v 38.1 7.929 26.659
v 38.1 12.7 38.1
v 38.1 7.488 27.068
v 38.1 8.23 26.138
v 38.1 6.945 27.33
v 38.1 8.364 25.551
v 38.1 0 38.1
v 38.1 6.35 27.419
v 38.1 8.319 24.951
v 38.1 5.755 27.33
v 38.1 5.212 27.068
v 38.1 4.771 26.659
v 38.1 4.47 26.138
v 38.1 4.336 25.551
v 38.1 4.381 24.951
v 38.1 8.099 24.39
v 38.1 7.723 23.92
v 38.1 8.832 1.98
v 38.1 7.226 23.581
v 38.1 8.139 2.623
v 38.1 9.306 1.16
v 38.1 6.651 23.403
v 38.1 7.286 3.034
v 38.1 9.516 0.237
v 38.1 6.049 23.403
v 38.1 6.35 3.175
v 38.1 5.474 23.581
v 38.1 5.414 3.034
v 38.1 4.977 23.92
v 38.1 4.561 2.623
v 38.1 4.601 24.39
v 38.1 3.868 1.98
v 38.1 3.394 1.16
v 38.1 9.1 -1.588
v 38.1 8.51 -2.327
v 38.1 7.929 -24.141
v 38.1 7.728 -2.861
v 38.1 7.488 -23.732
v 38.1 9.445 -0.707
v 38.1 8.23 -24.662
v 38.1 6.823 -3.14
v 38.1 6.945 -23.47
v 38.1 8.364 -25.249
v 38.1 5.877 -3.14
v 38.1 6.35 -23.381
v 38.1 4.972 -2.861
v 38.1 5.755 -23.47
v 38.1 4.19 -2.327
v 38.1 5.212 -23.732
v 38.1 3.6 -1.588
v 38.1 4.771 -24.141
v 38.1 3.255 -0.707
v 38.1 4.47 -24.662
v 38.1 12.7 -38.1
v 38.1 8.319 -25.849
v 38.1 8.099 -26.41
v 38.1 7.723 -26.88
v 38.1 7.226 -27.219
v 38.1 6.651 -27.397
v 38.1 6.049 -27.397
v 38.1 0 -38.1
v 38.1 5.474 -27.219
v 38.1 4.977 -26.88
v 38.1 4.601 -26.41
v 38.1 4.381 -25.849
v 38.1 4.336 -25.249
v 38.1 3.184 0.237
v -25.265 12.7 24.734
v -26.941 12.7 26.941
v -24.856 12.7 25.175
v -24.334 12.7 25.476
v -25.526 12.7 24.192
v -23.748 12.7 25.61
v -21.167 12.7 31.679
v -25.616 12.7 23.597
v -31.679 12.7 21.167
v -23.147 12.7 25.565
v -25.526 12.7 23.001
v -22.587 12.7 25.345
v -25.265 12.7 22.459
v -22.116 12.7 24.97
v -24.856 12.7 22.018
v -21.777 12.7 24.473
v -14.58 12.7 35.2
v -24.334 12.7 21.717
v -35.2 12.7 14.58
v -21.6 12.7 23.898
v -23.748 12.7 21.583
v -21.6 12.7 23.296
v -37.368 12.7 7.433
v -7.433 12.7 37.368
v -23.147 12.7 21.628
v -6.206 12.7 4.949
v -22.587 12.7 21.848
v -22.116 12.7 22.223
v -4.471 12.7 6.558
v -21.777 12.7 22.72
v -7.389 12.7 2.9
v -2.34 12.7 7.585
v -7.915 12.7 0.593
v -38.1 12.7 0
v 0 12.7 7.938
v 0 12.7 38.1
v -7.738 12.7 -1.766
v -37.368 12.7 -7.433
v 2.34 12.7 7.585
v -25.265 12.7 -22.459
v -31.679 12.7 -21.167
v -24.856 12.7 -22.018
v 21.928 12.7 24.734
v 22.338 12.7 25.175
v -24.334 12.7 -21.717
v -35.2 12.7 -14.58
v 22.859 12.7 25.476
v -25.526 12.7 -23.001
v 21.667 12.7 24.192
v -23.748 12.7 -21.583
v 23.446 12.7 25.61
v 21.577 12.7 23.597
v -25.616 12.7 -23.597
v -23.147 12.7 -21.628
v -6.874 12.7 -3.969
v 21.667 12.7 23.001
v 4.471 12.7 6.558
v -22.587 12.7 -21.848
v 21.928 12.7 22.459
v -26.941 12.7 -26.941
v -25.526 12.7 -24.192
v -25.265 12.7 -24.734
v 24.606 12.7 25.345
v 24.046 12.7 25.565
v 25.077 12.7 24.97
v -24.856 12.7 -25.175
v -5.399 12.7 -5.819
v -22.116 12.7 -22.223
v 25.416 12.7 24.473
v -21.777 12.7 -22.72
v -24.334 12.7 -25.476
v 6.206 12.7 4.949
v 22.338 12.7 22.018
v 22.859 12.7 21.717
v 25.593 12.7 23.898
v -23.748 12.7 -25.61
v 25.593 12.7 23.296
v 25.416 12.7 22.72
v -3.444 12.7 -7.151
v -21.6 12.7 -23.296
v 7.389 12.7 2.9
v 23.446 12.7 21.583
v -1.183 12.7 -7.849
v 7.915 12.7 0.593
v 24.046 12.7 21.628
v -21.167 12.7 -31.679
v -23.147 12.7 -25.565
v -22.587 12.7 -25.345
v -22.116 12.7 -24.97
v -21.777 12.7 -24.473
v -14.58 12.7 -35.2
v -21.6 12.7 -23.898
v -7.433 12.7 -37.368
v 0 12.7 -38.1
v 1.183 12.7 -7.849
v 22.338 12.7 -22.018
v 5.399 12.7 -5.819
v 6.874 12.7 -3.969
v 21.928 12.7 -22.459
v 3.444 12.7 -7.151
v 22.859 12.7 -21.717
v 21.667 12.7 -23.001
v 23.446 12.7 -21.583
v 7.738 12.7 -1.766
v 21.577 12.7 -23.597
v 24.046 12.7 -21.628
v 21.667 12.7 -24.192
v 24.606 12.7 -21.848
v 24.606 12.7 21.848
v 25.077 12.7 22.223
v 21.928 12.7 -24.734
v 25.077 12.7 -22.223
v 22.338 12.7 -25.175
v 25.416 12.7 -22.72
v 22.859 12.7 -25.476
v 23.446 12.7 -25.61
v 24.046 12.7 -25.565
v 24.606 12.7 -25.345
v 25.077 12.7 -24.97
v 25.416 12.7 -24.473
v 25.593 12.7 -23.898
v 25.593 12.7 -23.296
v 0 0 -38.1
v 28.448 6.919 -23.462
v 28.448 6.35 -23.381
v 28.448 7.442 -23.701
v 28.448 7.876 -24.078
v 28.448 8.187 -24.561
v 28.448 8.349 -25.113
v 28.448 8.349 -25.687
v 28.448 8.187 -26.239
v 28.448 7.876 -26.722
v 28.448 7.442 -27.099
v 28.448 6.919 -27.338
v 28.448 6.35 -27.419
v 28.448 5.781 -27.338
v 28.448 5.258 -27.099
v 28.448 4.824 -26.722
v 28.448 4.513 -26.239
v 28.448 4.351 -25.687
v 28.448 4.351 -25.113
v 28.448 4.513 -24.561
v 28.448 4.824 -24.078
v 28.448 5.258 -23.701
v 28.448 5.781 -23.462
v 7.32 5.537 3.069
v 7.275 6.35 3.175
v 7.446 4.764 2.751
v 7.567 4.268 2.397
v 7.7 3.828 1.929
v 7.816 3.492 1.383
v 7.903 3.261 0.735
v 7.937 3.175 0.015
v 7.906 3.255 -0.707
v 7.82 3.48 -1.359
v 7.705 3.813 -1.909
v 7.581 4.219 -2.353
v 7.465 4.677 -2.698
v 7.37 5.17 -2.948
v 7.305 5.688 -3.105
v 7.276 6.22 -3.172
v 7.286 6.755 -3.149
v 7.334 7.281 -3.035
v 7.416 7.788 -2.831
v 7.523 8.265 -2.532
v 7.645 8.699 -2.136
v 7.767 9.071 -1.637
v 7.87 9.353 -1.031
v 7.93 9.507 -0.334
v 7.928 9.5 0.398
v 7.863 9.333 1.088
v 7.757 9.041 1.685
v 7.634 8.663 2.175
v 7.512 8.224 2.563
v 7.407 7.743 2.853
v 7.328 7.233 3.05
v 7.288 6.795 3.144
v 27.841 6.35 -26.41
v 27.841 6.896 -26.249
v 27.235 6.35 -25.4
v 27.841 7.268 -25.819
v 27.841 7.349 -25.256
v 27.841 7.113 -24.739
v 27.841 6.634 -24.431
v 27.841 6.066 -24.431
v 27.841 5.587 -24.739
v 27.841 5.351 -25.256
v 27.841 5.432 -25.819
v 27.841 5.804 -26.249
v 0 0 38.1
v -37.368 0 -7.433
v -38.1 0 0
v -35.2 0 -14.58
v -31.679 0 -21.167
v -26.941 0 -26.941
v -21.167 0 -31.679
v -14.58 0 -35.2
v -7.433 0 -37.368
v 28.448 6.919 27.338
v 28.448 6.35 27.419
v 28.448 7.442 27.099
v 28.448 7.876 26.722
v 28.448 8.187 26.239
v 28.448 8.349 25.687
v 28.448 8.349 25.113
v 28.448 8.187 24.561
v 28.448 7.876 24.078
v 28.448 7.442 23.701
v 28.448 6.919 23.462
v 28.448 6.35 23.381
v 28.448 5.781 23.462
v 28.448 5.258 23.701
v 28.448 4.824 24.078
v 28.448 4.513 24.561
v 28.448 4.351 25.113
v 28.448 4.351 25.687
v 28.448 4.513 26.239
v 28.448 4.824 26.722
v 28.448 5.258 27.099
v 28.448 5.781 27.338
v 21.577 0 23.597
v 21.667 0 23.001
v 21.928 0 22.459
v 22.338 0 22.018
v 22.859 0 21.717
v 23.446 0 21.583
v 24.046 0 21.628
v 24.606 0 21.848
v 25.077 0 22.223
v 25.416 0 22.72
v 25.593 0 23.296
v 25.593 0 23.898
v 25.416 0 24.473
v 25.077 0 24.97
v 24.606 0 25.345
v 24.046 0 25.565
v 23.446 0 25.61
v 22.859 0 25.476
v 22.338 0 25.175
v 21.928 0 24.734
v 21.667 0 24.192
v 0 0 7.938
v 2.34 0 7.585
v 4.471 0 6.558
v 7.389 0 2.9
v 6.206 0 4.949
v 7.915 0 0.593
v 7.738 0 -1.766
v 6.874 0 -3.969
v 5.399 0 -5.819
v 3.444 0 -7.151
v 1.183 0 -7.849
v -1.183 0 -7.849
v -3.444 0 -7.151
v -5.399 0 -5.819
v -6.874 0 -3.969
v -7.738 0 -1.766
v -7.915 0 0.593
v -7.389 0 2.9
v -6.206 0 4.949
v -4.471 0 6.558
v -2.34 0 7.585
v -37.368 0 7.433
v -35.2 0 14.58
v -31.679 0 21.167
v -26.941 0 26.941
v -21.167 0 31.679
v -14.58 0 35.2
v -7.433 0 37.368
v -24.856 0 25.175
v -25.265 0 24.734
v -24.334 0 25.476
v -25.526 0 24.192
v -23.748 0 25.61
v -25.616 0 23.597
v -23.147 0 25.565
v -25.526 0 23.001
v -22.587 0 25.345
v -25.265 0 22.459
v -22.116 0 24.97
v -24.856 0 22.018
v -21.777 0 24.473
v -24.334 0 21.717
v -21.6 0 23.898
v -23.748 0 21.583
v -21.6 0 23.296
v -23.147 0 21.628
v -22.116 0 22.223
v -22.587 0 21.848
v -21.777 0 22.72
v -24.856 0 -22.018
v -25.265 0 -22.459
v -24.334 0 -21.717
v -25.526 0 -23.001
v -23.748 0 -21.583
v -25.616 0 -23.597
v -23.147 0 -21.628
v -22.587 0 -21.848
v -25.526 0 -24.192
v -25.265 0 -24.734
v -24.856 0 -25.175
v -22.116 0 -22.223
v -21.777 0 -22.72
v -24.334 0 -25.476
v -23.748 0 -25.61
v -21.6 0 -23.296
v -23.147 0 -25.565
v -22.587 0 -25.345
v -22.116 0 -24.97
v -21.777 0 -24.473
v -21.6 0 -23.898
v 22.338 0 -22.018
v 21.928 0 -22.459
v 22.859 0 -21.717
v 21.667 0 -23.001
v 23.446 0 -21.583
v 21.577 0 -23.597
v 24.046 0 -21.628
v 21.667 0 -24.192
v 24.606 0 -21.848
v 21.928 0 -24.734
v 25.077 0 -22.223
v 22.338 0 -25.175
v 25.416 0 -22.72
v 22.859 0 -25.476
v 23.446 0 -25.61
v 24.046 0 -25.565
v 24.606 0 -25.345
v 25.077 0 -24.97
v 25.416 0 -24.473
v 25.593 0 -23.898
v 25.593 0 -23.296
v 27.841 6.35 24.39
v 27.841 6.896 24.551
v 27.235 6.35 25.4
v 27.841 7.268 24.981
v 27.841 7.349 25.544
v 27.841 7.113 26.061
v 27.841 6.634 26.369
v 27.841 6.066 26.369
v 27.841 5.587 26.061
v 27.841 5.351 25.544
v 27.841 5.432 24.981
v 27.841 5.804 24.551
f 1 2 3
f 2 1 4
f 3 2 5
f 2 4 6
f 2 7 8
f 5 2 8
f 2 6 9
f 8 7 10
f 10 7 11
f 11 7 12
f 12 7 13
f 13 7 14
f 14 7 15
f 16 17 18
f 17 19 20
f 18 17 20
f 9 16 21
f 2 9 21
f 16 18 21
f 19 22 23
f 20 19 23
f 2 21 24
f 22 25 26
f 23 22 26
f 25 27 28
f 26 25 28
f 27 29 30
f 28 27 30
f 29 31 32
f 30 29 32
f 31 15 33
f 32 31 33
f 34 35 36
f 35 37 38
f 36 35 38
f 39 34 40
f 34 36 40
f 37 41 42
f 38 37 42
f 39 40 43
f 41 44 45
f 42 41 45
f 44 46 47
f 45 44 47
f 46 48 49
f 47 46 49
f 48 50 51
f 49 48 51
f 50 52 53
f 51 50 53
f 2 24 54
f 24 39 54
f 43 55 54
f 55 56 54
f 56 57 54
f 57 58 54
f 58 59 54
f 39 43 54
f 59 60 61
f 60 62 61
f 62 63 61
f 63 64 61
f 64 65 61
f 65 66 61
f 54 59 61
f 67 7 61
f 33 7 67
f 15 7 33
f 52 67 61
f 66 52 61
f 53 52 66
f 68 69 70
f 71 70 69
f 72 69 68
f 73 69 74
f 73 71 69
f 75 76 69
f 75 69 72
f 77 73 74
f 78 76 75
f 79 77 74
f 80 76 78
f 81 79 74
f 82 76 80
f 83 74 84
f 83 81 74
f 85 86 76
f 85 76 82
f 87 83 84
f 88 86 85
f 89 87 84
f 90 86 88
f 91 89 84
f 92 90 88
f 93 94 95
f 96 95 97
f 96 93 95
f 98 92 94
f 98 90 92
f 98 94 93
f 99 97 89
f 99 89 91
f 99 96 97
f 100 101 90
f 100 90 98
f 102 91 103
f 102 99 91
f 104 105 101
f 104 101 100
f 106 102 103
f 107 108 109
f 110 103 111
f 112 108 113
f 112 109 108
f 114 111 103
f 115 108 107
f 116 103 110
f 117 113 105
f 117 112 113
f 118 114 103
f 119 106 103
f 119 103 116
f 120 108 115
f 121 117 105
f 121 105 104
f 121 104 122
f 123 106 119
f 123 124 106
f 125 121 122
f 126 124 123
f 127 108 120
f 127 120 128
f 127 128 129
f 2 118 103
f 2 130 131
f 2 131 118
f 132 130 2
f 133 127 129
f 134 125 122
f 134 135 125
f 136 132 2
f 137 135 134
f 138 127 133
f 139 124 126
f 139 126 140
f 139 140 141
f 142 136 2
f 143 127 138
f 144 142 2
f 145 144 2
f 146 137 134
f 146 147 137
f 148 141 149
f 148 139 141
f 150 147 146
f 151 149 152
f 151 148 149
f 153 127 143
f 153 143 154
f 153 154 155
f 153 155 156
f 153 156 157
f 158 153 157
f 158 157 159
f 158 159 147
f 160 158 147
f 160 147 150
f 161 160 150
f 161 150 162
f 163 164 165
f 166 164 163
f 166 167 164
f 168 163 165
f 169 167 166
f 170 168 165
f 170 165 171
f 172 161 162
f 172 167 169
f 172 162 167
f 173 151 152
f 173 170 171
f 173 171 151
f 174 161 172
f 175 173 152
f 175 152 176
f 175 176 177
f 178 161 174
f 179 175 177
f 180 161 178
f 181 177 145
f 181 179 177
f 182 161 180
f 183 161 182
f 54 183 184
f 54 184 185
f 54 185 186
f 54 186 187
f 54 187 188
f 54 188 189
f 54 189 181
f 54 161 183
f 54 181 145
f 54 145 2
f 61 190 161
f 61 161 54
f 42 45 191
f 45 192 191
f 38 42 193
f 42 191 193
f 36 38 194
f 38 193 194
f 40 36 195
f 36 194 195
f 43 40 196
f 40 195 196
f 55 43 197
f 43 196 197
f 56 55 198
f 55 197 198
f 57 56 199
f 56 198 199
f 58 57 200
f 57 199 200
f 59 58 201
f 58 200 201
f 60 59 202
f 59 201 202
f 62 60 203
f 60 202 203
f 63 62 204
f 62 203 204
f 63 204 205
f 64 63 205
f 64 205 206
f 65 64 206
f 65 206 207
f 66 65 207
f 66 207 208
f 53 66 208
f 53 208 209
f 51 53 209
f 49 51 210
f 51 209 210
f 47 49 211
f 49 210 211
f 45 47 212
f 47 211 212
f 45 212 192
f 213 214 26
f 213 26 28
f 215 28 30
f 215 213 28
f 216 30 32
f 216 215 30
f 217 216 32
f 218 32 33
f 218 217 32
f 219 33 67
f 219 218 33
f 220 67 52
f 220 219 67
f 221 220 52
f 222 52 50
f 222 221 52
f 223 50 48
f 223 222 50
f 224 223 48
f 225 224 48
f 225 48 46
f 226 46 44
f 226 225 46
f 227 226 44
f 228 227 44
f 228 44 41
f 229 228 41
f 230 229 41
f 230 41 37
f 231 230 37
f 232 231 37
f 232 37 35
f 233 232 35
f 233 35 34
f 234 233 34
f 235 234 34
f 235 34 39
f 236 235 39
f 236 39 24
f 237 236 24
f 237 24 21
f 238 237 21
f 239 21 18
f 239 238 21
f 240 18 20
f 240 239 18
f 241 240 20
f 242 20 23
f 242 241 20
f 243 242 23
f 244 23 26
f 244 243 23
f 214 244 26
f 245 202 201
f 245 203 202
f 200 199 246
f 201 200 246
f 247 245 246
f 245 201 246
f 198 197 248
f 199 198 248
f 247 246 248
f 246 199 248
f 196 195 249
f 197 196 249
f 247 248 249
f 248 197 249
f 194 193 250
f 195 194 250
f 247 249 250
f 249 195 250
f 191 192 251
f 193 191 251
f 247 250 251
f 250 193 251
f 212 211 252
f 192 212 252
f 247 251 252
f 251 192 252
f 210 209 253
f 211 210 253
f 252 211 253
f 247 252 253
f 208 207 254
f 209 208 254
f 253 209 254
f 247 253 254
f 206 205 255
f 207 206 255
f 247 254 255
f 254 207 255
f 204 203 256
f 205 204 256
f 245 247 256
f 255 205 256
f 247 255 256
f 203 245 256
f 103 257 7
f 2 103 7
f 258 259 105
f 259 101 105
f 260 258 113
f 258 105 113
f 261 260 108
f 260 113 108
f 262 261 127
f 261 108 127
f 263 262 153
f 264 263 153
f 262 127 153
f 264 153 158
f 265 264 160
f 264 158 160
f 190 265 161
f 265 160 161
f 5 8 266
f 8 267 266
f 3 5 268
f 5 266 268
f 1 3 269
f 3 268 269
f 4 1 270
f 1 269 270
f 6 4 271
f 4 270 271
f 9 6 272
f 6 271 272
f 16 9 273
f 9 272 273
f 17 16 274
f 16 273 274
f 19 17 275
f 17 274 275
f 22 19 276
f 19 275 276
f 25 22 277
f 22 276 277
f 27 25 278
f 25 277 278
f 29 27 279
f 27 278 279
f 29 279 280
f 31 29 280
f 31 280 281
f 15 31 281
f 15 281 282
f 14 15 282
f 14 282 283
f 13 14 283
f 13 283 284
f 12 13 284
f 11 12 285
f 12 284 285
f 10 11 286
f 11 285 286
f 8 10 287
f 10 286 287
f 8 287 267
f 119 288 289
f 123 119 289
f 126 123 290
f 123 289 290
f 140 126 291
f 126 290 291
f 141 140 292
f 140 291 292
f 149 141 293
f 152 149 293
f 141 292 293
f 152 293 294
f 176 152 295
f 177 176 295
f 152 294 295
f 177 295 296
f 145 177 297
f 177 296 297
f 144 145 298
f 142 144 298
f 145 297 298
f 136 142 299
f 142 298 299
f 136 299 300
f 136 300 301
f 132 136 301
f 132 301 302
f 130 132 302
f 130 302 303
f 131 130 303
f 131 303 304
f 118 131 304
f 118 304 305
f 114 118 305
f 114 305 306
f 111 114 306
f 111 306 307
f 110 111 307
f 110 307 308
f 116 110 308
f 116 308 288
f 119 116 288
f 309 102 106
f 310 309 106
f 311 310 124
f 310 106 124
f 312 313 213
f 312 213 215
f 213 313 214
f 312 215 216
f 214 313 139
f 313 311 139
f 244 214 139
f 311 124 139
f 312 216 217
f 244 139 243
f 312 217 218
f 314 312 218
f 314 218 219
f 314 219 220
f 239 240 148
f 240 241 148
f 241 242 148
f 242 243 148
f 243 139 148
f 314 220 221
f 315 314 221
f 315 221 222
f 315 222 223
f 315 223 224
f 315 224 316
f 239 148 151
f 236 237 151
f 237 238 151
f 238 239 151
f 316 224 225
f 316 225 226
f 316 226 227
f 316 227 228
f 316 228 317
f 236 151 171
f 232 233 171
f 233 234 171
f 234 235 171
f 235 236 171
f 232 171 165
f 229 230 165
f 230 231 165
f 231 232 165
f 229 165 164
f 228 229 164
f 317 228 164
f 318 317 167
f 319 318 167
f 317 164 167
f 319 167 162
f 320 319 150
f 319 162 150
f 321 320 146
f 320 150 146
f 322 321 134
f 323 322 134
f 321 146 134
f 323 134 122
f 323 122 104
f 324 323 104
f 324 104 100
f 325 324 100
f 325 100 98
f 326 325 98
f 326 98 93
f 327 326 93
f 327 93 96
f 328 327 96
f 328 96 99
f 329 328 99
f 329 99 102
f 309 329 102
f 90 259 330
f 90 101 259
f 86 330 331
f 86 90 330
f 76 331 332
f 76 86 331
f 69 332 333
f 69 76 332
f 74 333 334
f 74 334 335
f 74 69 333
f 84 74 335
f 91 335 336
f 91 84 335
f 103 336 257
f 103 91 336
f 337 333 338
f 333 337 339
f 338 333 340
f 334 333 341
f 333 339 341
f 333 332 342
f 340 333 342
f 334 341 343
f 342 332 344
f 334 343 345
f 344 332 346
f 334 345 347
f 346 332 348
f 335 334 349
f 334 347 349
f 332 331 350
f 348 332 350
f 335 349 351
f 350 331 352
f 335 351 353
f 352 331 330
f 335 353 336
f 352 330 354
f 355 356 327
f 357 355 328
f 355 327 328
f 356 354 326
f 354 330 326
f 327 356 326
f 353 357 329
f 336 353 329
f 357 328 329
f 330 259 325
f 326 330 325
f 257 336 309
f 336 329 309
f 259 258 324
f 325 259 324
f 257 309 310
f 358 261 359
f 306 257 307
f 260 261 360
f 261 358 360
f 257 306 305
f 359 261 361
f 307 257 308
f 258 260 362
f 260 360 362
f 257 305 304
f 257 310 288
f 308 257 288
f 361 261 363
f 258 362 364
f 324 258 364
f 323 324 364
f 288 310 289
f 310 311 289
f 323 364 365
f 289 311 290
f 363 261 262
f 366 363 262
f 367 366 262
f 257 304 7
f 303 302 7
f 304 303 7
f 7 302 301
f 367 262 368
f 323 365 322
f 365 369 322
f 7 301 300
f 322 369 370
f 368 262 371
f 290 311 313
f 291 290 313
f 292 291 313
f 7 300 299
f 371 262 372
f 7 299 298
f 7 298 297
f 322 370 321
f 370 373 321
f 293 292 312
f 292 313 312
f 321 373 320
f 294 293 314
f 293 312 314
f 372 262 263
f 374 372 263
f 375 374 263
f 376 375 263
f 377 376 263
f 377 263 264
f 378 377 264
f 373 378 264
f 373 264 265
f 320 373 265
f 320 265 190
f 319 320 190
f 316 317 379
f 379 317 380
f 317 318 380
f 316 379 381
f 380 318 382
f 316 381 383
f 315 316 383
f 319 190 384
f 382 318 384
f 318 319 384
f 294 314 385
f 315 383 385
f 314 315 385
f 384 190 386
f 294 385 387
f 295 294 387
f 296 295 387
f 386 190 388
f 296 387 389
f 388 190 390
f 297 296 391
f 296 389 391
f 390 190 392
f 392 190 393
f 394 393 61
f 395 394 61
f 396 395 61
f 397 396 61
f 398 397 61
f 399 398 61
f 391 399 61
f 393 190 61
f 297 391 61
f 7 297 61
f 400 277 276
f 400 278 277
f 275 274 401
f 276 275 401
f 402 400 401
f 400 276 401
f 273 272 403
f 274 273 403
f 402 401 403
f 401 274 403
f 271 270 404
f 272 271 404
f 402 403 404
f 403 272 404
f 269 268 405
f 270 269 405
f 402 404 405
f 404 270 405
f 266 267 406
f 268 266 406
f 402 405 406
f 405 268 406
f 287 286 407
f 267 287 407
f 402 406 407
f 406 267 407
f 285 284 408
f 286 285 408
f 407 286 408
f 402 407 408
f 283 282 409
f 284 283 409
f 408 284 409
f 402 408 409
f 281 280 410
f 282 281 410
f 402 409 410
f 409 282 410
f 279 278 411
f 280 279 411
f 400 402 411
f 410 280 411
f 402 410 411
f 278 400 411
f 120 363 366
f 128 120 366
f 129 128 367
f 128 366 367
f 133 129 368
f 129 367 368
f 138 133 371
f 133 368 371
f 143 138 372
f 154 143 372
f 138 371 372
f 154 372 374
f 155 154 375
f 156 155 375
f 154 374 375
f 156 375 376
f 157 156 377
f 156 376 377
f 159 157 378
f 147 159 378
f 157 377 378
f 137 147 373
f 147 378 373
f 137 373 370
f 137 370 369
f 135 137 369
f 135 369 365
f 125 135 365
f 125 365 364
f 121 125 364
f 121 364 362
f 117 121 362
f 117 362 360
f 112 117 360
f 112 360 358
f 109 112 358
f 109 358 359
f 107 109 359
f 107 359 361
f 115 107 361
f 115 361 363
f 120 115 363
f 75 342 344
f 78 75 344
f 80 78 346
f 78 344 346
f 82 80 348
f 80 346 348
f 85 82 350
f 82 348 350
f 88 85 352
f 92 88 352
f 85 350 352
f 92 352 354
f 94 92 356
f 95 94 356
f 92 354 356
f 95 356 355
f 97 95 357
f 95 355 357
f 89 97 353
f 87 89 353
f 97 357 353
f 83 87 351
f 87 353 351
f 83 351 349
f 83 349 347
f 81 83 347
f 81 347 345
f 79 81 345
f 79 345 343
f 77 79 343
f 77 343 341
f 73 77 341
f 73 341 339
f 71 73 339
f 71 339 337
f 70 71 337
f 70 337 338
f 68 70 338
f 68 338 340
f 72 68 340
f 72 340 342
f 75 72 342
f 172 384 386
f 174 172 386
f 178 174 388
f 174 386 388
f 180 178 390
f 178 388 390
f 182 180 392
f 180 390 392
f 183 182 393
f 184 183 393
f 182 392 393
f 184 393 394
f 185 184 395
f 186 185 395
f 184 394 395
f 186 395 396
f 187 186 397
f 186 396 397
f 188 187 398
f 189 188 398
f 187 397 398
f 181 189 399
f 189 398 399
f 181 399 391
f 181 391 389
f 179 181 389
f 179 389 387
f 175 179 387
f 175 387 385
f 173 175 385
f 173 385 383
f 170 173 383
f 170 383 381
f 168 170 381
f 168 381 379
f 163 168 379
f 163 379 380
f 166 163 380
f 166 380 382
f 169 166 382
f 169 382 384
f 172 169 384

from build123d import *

# Parameters (mm, degrees)
SKETCH1_W                  = 76.2
SKETCH1_H                  = 76.2
BOSS_EXTRUDE1_DEPTH        = 12.7
F_10_32_TAPPED_HOLE1_D     = 4.0386
F_10_32_TAPPED_HOLE1_DEPTH = 9.652
F_10_32_TAPPED_HOLE1_TIP   = 1.213317848
F_10_32_TAPPED_HOLE2_D     = 4.0386
SKETCH9_R                  = 7.9375
CUT_EXTRUDE2_DEPTH         = 56.358016583
FILLET1_R                  = 38.1
SKETCH10_R                 = 3.175
CUT_EXTRUDE3_DEPTH         = 56.358016583


with BuildPart() as part:
    # Sketch1 → Boss-Extrude1 (new body)
    with BuildSketch(Plane(origin=(0, 0, 0), x_dir=(1, 0, 0), z_dir=(0, 1, 0))):
        Rectangle(SKETCH1_W, SKETCH1_H)
    extrude(amount=BOSS_EXTRUDE1_DEPTH)

    # #10-32 Tapped Hole1
    with Locations(Plane(origin=(38.1, 0, 0), x_dir=(0, 0, -1), z_dir=(1, 0, 0))):
        with Locations((-25.4, 6.35), (25.4, 6.35)):
            Hole(F_10_32_TAPPED_HOLE1_D / 2, depth=F_10_32_TAPPED_HOLE1_DEPTH)
            with Locations((0, 0, -(F_10_32_TAPPED_HOLE1_DEPTH + F_10_32_TAPPED_HOLE1_TIP / 2))):  # 118° drill point
                Cone(0, F_10_32_TAPPED_HOLE1_D / 2, F_10_32_TAPPED_HOLE1_TIP, mode=Mode.SUBTRACT)

    # #10-32 Tapped Hole2 (through all)
    with Locations(Plane(origin=(0, 12.7, 0), x_dir=(1, 0, 0), z_dir=(0, 1, 0))):
        with Locations((-23.5966, -23.5966), (-23.5966, 23.5966), (23.5966, 23.5966), (23.5966, -23.5966)):
            Hole(F_10_32_TAPPED_HOLE2_D / 2)

    # Sketch9 → Cut-Extrude2 (cut, through all)
    with BuildSketch(Plane(origin=(0, 12.7, 0), x_dir=(1, 0, 0), z_dir=(0, 1, 0))):
        with Locations(Location((0, 0, 0), (0, 0, 270))):
            Circle(SKETCH9_R)
    extrude(amount=-CUT_EXTRUDE2_DEPTH, mode=Mode.SUBTRACT)

    # Fillet1
    fillet1_edges = [part.edges().sort_by_distance(p)[0] for p in [
        (-38.1, 6.35, -38.1),
        (-38.1, 6.35, 38.1),
    ]]
    fillet(fillet1_edges, radius=FILLET1_R - 0.0001)  # a hair under: the kernel refuses the full size

    # Sketch10 → Cut-Extrude3 (cut, through all)
    with BuildSketch(Plane(origin=(0, 0, 0), x_dir=(0, 0, -1), z_dir=(1, 0, 0))):
        with Locations(Location((0, 6.35, 0), (0, 0, 180))):
            Circle(SKETCH10_R)
    extrude(amount=CUT_EXTRUDE3_DEPTH, mode=Mode.SUBTRACT)


solid = part.part
